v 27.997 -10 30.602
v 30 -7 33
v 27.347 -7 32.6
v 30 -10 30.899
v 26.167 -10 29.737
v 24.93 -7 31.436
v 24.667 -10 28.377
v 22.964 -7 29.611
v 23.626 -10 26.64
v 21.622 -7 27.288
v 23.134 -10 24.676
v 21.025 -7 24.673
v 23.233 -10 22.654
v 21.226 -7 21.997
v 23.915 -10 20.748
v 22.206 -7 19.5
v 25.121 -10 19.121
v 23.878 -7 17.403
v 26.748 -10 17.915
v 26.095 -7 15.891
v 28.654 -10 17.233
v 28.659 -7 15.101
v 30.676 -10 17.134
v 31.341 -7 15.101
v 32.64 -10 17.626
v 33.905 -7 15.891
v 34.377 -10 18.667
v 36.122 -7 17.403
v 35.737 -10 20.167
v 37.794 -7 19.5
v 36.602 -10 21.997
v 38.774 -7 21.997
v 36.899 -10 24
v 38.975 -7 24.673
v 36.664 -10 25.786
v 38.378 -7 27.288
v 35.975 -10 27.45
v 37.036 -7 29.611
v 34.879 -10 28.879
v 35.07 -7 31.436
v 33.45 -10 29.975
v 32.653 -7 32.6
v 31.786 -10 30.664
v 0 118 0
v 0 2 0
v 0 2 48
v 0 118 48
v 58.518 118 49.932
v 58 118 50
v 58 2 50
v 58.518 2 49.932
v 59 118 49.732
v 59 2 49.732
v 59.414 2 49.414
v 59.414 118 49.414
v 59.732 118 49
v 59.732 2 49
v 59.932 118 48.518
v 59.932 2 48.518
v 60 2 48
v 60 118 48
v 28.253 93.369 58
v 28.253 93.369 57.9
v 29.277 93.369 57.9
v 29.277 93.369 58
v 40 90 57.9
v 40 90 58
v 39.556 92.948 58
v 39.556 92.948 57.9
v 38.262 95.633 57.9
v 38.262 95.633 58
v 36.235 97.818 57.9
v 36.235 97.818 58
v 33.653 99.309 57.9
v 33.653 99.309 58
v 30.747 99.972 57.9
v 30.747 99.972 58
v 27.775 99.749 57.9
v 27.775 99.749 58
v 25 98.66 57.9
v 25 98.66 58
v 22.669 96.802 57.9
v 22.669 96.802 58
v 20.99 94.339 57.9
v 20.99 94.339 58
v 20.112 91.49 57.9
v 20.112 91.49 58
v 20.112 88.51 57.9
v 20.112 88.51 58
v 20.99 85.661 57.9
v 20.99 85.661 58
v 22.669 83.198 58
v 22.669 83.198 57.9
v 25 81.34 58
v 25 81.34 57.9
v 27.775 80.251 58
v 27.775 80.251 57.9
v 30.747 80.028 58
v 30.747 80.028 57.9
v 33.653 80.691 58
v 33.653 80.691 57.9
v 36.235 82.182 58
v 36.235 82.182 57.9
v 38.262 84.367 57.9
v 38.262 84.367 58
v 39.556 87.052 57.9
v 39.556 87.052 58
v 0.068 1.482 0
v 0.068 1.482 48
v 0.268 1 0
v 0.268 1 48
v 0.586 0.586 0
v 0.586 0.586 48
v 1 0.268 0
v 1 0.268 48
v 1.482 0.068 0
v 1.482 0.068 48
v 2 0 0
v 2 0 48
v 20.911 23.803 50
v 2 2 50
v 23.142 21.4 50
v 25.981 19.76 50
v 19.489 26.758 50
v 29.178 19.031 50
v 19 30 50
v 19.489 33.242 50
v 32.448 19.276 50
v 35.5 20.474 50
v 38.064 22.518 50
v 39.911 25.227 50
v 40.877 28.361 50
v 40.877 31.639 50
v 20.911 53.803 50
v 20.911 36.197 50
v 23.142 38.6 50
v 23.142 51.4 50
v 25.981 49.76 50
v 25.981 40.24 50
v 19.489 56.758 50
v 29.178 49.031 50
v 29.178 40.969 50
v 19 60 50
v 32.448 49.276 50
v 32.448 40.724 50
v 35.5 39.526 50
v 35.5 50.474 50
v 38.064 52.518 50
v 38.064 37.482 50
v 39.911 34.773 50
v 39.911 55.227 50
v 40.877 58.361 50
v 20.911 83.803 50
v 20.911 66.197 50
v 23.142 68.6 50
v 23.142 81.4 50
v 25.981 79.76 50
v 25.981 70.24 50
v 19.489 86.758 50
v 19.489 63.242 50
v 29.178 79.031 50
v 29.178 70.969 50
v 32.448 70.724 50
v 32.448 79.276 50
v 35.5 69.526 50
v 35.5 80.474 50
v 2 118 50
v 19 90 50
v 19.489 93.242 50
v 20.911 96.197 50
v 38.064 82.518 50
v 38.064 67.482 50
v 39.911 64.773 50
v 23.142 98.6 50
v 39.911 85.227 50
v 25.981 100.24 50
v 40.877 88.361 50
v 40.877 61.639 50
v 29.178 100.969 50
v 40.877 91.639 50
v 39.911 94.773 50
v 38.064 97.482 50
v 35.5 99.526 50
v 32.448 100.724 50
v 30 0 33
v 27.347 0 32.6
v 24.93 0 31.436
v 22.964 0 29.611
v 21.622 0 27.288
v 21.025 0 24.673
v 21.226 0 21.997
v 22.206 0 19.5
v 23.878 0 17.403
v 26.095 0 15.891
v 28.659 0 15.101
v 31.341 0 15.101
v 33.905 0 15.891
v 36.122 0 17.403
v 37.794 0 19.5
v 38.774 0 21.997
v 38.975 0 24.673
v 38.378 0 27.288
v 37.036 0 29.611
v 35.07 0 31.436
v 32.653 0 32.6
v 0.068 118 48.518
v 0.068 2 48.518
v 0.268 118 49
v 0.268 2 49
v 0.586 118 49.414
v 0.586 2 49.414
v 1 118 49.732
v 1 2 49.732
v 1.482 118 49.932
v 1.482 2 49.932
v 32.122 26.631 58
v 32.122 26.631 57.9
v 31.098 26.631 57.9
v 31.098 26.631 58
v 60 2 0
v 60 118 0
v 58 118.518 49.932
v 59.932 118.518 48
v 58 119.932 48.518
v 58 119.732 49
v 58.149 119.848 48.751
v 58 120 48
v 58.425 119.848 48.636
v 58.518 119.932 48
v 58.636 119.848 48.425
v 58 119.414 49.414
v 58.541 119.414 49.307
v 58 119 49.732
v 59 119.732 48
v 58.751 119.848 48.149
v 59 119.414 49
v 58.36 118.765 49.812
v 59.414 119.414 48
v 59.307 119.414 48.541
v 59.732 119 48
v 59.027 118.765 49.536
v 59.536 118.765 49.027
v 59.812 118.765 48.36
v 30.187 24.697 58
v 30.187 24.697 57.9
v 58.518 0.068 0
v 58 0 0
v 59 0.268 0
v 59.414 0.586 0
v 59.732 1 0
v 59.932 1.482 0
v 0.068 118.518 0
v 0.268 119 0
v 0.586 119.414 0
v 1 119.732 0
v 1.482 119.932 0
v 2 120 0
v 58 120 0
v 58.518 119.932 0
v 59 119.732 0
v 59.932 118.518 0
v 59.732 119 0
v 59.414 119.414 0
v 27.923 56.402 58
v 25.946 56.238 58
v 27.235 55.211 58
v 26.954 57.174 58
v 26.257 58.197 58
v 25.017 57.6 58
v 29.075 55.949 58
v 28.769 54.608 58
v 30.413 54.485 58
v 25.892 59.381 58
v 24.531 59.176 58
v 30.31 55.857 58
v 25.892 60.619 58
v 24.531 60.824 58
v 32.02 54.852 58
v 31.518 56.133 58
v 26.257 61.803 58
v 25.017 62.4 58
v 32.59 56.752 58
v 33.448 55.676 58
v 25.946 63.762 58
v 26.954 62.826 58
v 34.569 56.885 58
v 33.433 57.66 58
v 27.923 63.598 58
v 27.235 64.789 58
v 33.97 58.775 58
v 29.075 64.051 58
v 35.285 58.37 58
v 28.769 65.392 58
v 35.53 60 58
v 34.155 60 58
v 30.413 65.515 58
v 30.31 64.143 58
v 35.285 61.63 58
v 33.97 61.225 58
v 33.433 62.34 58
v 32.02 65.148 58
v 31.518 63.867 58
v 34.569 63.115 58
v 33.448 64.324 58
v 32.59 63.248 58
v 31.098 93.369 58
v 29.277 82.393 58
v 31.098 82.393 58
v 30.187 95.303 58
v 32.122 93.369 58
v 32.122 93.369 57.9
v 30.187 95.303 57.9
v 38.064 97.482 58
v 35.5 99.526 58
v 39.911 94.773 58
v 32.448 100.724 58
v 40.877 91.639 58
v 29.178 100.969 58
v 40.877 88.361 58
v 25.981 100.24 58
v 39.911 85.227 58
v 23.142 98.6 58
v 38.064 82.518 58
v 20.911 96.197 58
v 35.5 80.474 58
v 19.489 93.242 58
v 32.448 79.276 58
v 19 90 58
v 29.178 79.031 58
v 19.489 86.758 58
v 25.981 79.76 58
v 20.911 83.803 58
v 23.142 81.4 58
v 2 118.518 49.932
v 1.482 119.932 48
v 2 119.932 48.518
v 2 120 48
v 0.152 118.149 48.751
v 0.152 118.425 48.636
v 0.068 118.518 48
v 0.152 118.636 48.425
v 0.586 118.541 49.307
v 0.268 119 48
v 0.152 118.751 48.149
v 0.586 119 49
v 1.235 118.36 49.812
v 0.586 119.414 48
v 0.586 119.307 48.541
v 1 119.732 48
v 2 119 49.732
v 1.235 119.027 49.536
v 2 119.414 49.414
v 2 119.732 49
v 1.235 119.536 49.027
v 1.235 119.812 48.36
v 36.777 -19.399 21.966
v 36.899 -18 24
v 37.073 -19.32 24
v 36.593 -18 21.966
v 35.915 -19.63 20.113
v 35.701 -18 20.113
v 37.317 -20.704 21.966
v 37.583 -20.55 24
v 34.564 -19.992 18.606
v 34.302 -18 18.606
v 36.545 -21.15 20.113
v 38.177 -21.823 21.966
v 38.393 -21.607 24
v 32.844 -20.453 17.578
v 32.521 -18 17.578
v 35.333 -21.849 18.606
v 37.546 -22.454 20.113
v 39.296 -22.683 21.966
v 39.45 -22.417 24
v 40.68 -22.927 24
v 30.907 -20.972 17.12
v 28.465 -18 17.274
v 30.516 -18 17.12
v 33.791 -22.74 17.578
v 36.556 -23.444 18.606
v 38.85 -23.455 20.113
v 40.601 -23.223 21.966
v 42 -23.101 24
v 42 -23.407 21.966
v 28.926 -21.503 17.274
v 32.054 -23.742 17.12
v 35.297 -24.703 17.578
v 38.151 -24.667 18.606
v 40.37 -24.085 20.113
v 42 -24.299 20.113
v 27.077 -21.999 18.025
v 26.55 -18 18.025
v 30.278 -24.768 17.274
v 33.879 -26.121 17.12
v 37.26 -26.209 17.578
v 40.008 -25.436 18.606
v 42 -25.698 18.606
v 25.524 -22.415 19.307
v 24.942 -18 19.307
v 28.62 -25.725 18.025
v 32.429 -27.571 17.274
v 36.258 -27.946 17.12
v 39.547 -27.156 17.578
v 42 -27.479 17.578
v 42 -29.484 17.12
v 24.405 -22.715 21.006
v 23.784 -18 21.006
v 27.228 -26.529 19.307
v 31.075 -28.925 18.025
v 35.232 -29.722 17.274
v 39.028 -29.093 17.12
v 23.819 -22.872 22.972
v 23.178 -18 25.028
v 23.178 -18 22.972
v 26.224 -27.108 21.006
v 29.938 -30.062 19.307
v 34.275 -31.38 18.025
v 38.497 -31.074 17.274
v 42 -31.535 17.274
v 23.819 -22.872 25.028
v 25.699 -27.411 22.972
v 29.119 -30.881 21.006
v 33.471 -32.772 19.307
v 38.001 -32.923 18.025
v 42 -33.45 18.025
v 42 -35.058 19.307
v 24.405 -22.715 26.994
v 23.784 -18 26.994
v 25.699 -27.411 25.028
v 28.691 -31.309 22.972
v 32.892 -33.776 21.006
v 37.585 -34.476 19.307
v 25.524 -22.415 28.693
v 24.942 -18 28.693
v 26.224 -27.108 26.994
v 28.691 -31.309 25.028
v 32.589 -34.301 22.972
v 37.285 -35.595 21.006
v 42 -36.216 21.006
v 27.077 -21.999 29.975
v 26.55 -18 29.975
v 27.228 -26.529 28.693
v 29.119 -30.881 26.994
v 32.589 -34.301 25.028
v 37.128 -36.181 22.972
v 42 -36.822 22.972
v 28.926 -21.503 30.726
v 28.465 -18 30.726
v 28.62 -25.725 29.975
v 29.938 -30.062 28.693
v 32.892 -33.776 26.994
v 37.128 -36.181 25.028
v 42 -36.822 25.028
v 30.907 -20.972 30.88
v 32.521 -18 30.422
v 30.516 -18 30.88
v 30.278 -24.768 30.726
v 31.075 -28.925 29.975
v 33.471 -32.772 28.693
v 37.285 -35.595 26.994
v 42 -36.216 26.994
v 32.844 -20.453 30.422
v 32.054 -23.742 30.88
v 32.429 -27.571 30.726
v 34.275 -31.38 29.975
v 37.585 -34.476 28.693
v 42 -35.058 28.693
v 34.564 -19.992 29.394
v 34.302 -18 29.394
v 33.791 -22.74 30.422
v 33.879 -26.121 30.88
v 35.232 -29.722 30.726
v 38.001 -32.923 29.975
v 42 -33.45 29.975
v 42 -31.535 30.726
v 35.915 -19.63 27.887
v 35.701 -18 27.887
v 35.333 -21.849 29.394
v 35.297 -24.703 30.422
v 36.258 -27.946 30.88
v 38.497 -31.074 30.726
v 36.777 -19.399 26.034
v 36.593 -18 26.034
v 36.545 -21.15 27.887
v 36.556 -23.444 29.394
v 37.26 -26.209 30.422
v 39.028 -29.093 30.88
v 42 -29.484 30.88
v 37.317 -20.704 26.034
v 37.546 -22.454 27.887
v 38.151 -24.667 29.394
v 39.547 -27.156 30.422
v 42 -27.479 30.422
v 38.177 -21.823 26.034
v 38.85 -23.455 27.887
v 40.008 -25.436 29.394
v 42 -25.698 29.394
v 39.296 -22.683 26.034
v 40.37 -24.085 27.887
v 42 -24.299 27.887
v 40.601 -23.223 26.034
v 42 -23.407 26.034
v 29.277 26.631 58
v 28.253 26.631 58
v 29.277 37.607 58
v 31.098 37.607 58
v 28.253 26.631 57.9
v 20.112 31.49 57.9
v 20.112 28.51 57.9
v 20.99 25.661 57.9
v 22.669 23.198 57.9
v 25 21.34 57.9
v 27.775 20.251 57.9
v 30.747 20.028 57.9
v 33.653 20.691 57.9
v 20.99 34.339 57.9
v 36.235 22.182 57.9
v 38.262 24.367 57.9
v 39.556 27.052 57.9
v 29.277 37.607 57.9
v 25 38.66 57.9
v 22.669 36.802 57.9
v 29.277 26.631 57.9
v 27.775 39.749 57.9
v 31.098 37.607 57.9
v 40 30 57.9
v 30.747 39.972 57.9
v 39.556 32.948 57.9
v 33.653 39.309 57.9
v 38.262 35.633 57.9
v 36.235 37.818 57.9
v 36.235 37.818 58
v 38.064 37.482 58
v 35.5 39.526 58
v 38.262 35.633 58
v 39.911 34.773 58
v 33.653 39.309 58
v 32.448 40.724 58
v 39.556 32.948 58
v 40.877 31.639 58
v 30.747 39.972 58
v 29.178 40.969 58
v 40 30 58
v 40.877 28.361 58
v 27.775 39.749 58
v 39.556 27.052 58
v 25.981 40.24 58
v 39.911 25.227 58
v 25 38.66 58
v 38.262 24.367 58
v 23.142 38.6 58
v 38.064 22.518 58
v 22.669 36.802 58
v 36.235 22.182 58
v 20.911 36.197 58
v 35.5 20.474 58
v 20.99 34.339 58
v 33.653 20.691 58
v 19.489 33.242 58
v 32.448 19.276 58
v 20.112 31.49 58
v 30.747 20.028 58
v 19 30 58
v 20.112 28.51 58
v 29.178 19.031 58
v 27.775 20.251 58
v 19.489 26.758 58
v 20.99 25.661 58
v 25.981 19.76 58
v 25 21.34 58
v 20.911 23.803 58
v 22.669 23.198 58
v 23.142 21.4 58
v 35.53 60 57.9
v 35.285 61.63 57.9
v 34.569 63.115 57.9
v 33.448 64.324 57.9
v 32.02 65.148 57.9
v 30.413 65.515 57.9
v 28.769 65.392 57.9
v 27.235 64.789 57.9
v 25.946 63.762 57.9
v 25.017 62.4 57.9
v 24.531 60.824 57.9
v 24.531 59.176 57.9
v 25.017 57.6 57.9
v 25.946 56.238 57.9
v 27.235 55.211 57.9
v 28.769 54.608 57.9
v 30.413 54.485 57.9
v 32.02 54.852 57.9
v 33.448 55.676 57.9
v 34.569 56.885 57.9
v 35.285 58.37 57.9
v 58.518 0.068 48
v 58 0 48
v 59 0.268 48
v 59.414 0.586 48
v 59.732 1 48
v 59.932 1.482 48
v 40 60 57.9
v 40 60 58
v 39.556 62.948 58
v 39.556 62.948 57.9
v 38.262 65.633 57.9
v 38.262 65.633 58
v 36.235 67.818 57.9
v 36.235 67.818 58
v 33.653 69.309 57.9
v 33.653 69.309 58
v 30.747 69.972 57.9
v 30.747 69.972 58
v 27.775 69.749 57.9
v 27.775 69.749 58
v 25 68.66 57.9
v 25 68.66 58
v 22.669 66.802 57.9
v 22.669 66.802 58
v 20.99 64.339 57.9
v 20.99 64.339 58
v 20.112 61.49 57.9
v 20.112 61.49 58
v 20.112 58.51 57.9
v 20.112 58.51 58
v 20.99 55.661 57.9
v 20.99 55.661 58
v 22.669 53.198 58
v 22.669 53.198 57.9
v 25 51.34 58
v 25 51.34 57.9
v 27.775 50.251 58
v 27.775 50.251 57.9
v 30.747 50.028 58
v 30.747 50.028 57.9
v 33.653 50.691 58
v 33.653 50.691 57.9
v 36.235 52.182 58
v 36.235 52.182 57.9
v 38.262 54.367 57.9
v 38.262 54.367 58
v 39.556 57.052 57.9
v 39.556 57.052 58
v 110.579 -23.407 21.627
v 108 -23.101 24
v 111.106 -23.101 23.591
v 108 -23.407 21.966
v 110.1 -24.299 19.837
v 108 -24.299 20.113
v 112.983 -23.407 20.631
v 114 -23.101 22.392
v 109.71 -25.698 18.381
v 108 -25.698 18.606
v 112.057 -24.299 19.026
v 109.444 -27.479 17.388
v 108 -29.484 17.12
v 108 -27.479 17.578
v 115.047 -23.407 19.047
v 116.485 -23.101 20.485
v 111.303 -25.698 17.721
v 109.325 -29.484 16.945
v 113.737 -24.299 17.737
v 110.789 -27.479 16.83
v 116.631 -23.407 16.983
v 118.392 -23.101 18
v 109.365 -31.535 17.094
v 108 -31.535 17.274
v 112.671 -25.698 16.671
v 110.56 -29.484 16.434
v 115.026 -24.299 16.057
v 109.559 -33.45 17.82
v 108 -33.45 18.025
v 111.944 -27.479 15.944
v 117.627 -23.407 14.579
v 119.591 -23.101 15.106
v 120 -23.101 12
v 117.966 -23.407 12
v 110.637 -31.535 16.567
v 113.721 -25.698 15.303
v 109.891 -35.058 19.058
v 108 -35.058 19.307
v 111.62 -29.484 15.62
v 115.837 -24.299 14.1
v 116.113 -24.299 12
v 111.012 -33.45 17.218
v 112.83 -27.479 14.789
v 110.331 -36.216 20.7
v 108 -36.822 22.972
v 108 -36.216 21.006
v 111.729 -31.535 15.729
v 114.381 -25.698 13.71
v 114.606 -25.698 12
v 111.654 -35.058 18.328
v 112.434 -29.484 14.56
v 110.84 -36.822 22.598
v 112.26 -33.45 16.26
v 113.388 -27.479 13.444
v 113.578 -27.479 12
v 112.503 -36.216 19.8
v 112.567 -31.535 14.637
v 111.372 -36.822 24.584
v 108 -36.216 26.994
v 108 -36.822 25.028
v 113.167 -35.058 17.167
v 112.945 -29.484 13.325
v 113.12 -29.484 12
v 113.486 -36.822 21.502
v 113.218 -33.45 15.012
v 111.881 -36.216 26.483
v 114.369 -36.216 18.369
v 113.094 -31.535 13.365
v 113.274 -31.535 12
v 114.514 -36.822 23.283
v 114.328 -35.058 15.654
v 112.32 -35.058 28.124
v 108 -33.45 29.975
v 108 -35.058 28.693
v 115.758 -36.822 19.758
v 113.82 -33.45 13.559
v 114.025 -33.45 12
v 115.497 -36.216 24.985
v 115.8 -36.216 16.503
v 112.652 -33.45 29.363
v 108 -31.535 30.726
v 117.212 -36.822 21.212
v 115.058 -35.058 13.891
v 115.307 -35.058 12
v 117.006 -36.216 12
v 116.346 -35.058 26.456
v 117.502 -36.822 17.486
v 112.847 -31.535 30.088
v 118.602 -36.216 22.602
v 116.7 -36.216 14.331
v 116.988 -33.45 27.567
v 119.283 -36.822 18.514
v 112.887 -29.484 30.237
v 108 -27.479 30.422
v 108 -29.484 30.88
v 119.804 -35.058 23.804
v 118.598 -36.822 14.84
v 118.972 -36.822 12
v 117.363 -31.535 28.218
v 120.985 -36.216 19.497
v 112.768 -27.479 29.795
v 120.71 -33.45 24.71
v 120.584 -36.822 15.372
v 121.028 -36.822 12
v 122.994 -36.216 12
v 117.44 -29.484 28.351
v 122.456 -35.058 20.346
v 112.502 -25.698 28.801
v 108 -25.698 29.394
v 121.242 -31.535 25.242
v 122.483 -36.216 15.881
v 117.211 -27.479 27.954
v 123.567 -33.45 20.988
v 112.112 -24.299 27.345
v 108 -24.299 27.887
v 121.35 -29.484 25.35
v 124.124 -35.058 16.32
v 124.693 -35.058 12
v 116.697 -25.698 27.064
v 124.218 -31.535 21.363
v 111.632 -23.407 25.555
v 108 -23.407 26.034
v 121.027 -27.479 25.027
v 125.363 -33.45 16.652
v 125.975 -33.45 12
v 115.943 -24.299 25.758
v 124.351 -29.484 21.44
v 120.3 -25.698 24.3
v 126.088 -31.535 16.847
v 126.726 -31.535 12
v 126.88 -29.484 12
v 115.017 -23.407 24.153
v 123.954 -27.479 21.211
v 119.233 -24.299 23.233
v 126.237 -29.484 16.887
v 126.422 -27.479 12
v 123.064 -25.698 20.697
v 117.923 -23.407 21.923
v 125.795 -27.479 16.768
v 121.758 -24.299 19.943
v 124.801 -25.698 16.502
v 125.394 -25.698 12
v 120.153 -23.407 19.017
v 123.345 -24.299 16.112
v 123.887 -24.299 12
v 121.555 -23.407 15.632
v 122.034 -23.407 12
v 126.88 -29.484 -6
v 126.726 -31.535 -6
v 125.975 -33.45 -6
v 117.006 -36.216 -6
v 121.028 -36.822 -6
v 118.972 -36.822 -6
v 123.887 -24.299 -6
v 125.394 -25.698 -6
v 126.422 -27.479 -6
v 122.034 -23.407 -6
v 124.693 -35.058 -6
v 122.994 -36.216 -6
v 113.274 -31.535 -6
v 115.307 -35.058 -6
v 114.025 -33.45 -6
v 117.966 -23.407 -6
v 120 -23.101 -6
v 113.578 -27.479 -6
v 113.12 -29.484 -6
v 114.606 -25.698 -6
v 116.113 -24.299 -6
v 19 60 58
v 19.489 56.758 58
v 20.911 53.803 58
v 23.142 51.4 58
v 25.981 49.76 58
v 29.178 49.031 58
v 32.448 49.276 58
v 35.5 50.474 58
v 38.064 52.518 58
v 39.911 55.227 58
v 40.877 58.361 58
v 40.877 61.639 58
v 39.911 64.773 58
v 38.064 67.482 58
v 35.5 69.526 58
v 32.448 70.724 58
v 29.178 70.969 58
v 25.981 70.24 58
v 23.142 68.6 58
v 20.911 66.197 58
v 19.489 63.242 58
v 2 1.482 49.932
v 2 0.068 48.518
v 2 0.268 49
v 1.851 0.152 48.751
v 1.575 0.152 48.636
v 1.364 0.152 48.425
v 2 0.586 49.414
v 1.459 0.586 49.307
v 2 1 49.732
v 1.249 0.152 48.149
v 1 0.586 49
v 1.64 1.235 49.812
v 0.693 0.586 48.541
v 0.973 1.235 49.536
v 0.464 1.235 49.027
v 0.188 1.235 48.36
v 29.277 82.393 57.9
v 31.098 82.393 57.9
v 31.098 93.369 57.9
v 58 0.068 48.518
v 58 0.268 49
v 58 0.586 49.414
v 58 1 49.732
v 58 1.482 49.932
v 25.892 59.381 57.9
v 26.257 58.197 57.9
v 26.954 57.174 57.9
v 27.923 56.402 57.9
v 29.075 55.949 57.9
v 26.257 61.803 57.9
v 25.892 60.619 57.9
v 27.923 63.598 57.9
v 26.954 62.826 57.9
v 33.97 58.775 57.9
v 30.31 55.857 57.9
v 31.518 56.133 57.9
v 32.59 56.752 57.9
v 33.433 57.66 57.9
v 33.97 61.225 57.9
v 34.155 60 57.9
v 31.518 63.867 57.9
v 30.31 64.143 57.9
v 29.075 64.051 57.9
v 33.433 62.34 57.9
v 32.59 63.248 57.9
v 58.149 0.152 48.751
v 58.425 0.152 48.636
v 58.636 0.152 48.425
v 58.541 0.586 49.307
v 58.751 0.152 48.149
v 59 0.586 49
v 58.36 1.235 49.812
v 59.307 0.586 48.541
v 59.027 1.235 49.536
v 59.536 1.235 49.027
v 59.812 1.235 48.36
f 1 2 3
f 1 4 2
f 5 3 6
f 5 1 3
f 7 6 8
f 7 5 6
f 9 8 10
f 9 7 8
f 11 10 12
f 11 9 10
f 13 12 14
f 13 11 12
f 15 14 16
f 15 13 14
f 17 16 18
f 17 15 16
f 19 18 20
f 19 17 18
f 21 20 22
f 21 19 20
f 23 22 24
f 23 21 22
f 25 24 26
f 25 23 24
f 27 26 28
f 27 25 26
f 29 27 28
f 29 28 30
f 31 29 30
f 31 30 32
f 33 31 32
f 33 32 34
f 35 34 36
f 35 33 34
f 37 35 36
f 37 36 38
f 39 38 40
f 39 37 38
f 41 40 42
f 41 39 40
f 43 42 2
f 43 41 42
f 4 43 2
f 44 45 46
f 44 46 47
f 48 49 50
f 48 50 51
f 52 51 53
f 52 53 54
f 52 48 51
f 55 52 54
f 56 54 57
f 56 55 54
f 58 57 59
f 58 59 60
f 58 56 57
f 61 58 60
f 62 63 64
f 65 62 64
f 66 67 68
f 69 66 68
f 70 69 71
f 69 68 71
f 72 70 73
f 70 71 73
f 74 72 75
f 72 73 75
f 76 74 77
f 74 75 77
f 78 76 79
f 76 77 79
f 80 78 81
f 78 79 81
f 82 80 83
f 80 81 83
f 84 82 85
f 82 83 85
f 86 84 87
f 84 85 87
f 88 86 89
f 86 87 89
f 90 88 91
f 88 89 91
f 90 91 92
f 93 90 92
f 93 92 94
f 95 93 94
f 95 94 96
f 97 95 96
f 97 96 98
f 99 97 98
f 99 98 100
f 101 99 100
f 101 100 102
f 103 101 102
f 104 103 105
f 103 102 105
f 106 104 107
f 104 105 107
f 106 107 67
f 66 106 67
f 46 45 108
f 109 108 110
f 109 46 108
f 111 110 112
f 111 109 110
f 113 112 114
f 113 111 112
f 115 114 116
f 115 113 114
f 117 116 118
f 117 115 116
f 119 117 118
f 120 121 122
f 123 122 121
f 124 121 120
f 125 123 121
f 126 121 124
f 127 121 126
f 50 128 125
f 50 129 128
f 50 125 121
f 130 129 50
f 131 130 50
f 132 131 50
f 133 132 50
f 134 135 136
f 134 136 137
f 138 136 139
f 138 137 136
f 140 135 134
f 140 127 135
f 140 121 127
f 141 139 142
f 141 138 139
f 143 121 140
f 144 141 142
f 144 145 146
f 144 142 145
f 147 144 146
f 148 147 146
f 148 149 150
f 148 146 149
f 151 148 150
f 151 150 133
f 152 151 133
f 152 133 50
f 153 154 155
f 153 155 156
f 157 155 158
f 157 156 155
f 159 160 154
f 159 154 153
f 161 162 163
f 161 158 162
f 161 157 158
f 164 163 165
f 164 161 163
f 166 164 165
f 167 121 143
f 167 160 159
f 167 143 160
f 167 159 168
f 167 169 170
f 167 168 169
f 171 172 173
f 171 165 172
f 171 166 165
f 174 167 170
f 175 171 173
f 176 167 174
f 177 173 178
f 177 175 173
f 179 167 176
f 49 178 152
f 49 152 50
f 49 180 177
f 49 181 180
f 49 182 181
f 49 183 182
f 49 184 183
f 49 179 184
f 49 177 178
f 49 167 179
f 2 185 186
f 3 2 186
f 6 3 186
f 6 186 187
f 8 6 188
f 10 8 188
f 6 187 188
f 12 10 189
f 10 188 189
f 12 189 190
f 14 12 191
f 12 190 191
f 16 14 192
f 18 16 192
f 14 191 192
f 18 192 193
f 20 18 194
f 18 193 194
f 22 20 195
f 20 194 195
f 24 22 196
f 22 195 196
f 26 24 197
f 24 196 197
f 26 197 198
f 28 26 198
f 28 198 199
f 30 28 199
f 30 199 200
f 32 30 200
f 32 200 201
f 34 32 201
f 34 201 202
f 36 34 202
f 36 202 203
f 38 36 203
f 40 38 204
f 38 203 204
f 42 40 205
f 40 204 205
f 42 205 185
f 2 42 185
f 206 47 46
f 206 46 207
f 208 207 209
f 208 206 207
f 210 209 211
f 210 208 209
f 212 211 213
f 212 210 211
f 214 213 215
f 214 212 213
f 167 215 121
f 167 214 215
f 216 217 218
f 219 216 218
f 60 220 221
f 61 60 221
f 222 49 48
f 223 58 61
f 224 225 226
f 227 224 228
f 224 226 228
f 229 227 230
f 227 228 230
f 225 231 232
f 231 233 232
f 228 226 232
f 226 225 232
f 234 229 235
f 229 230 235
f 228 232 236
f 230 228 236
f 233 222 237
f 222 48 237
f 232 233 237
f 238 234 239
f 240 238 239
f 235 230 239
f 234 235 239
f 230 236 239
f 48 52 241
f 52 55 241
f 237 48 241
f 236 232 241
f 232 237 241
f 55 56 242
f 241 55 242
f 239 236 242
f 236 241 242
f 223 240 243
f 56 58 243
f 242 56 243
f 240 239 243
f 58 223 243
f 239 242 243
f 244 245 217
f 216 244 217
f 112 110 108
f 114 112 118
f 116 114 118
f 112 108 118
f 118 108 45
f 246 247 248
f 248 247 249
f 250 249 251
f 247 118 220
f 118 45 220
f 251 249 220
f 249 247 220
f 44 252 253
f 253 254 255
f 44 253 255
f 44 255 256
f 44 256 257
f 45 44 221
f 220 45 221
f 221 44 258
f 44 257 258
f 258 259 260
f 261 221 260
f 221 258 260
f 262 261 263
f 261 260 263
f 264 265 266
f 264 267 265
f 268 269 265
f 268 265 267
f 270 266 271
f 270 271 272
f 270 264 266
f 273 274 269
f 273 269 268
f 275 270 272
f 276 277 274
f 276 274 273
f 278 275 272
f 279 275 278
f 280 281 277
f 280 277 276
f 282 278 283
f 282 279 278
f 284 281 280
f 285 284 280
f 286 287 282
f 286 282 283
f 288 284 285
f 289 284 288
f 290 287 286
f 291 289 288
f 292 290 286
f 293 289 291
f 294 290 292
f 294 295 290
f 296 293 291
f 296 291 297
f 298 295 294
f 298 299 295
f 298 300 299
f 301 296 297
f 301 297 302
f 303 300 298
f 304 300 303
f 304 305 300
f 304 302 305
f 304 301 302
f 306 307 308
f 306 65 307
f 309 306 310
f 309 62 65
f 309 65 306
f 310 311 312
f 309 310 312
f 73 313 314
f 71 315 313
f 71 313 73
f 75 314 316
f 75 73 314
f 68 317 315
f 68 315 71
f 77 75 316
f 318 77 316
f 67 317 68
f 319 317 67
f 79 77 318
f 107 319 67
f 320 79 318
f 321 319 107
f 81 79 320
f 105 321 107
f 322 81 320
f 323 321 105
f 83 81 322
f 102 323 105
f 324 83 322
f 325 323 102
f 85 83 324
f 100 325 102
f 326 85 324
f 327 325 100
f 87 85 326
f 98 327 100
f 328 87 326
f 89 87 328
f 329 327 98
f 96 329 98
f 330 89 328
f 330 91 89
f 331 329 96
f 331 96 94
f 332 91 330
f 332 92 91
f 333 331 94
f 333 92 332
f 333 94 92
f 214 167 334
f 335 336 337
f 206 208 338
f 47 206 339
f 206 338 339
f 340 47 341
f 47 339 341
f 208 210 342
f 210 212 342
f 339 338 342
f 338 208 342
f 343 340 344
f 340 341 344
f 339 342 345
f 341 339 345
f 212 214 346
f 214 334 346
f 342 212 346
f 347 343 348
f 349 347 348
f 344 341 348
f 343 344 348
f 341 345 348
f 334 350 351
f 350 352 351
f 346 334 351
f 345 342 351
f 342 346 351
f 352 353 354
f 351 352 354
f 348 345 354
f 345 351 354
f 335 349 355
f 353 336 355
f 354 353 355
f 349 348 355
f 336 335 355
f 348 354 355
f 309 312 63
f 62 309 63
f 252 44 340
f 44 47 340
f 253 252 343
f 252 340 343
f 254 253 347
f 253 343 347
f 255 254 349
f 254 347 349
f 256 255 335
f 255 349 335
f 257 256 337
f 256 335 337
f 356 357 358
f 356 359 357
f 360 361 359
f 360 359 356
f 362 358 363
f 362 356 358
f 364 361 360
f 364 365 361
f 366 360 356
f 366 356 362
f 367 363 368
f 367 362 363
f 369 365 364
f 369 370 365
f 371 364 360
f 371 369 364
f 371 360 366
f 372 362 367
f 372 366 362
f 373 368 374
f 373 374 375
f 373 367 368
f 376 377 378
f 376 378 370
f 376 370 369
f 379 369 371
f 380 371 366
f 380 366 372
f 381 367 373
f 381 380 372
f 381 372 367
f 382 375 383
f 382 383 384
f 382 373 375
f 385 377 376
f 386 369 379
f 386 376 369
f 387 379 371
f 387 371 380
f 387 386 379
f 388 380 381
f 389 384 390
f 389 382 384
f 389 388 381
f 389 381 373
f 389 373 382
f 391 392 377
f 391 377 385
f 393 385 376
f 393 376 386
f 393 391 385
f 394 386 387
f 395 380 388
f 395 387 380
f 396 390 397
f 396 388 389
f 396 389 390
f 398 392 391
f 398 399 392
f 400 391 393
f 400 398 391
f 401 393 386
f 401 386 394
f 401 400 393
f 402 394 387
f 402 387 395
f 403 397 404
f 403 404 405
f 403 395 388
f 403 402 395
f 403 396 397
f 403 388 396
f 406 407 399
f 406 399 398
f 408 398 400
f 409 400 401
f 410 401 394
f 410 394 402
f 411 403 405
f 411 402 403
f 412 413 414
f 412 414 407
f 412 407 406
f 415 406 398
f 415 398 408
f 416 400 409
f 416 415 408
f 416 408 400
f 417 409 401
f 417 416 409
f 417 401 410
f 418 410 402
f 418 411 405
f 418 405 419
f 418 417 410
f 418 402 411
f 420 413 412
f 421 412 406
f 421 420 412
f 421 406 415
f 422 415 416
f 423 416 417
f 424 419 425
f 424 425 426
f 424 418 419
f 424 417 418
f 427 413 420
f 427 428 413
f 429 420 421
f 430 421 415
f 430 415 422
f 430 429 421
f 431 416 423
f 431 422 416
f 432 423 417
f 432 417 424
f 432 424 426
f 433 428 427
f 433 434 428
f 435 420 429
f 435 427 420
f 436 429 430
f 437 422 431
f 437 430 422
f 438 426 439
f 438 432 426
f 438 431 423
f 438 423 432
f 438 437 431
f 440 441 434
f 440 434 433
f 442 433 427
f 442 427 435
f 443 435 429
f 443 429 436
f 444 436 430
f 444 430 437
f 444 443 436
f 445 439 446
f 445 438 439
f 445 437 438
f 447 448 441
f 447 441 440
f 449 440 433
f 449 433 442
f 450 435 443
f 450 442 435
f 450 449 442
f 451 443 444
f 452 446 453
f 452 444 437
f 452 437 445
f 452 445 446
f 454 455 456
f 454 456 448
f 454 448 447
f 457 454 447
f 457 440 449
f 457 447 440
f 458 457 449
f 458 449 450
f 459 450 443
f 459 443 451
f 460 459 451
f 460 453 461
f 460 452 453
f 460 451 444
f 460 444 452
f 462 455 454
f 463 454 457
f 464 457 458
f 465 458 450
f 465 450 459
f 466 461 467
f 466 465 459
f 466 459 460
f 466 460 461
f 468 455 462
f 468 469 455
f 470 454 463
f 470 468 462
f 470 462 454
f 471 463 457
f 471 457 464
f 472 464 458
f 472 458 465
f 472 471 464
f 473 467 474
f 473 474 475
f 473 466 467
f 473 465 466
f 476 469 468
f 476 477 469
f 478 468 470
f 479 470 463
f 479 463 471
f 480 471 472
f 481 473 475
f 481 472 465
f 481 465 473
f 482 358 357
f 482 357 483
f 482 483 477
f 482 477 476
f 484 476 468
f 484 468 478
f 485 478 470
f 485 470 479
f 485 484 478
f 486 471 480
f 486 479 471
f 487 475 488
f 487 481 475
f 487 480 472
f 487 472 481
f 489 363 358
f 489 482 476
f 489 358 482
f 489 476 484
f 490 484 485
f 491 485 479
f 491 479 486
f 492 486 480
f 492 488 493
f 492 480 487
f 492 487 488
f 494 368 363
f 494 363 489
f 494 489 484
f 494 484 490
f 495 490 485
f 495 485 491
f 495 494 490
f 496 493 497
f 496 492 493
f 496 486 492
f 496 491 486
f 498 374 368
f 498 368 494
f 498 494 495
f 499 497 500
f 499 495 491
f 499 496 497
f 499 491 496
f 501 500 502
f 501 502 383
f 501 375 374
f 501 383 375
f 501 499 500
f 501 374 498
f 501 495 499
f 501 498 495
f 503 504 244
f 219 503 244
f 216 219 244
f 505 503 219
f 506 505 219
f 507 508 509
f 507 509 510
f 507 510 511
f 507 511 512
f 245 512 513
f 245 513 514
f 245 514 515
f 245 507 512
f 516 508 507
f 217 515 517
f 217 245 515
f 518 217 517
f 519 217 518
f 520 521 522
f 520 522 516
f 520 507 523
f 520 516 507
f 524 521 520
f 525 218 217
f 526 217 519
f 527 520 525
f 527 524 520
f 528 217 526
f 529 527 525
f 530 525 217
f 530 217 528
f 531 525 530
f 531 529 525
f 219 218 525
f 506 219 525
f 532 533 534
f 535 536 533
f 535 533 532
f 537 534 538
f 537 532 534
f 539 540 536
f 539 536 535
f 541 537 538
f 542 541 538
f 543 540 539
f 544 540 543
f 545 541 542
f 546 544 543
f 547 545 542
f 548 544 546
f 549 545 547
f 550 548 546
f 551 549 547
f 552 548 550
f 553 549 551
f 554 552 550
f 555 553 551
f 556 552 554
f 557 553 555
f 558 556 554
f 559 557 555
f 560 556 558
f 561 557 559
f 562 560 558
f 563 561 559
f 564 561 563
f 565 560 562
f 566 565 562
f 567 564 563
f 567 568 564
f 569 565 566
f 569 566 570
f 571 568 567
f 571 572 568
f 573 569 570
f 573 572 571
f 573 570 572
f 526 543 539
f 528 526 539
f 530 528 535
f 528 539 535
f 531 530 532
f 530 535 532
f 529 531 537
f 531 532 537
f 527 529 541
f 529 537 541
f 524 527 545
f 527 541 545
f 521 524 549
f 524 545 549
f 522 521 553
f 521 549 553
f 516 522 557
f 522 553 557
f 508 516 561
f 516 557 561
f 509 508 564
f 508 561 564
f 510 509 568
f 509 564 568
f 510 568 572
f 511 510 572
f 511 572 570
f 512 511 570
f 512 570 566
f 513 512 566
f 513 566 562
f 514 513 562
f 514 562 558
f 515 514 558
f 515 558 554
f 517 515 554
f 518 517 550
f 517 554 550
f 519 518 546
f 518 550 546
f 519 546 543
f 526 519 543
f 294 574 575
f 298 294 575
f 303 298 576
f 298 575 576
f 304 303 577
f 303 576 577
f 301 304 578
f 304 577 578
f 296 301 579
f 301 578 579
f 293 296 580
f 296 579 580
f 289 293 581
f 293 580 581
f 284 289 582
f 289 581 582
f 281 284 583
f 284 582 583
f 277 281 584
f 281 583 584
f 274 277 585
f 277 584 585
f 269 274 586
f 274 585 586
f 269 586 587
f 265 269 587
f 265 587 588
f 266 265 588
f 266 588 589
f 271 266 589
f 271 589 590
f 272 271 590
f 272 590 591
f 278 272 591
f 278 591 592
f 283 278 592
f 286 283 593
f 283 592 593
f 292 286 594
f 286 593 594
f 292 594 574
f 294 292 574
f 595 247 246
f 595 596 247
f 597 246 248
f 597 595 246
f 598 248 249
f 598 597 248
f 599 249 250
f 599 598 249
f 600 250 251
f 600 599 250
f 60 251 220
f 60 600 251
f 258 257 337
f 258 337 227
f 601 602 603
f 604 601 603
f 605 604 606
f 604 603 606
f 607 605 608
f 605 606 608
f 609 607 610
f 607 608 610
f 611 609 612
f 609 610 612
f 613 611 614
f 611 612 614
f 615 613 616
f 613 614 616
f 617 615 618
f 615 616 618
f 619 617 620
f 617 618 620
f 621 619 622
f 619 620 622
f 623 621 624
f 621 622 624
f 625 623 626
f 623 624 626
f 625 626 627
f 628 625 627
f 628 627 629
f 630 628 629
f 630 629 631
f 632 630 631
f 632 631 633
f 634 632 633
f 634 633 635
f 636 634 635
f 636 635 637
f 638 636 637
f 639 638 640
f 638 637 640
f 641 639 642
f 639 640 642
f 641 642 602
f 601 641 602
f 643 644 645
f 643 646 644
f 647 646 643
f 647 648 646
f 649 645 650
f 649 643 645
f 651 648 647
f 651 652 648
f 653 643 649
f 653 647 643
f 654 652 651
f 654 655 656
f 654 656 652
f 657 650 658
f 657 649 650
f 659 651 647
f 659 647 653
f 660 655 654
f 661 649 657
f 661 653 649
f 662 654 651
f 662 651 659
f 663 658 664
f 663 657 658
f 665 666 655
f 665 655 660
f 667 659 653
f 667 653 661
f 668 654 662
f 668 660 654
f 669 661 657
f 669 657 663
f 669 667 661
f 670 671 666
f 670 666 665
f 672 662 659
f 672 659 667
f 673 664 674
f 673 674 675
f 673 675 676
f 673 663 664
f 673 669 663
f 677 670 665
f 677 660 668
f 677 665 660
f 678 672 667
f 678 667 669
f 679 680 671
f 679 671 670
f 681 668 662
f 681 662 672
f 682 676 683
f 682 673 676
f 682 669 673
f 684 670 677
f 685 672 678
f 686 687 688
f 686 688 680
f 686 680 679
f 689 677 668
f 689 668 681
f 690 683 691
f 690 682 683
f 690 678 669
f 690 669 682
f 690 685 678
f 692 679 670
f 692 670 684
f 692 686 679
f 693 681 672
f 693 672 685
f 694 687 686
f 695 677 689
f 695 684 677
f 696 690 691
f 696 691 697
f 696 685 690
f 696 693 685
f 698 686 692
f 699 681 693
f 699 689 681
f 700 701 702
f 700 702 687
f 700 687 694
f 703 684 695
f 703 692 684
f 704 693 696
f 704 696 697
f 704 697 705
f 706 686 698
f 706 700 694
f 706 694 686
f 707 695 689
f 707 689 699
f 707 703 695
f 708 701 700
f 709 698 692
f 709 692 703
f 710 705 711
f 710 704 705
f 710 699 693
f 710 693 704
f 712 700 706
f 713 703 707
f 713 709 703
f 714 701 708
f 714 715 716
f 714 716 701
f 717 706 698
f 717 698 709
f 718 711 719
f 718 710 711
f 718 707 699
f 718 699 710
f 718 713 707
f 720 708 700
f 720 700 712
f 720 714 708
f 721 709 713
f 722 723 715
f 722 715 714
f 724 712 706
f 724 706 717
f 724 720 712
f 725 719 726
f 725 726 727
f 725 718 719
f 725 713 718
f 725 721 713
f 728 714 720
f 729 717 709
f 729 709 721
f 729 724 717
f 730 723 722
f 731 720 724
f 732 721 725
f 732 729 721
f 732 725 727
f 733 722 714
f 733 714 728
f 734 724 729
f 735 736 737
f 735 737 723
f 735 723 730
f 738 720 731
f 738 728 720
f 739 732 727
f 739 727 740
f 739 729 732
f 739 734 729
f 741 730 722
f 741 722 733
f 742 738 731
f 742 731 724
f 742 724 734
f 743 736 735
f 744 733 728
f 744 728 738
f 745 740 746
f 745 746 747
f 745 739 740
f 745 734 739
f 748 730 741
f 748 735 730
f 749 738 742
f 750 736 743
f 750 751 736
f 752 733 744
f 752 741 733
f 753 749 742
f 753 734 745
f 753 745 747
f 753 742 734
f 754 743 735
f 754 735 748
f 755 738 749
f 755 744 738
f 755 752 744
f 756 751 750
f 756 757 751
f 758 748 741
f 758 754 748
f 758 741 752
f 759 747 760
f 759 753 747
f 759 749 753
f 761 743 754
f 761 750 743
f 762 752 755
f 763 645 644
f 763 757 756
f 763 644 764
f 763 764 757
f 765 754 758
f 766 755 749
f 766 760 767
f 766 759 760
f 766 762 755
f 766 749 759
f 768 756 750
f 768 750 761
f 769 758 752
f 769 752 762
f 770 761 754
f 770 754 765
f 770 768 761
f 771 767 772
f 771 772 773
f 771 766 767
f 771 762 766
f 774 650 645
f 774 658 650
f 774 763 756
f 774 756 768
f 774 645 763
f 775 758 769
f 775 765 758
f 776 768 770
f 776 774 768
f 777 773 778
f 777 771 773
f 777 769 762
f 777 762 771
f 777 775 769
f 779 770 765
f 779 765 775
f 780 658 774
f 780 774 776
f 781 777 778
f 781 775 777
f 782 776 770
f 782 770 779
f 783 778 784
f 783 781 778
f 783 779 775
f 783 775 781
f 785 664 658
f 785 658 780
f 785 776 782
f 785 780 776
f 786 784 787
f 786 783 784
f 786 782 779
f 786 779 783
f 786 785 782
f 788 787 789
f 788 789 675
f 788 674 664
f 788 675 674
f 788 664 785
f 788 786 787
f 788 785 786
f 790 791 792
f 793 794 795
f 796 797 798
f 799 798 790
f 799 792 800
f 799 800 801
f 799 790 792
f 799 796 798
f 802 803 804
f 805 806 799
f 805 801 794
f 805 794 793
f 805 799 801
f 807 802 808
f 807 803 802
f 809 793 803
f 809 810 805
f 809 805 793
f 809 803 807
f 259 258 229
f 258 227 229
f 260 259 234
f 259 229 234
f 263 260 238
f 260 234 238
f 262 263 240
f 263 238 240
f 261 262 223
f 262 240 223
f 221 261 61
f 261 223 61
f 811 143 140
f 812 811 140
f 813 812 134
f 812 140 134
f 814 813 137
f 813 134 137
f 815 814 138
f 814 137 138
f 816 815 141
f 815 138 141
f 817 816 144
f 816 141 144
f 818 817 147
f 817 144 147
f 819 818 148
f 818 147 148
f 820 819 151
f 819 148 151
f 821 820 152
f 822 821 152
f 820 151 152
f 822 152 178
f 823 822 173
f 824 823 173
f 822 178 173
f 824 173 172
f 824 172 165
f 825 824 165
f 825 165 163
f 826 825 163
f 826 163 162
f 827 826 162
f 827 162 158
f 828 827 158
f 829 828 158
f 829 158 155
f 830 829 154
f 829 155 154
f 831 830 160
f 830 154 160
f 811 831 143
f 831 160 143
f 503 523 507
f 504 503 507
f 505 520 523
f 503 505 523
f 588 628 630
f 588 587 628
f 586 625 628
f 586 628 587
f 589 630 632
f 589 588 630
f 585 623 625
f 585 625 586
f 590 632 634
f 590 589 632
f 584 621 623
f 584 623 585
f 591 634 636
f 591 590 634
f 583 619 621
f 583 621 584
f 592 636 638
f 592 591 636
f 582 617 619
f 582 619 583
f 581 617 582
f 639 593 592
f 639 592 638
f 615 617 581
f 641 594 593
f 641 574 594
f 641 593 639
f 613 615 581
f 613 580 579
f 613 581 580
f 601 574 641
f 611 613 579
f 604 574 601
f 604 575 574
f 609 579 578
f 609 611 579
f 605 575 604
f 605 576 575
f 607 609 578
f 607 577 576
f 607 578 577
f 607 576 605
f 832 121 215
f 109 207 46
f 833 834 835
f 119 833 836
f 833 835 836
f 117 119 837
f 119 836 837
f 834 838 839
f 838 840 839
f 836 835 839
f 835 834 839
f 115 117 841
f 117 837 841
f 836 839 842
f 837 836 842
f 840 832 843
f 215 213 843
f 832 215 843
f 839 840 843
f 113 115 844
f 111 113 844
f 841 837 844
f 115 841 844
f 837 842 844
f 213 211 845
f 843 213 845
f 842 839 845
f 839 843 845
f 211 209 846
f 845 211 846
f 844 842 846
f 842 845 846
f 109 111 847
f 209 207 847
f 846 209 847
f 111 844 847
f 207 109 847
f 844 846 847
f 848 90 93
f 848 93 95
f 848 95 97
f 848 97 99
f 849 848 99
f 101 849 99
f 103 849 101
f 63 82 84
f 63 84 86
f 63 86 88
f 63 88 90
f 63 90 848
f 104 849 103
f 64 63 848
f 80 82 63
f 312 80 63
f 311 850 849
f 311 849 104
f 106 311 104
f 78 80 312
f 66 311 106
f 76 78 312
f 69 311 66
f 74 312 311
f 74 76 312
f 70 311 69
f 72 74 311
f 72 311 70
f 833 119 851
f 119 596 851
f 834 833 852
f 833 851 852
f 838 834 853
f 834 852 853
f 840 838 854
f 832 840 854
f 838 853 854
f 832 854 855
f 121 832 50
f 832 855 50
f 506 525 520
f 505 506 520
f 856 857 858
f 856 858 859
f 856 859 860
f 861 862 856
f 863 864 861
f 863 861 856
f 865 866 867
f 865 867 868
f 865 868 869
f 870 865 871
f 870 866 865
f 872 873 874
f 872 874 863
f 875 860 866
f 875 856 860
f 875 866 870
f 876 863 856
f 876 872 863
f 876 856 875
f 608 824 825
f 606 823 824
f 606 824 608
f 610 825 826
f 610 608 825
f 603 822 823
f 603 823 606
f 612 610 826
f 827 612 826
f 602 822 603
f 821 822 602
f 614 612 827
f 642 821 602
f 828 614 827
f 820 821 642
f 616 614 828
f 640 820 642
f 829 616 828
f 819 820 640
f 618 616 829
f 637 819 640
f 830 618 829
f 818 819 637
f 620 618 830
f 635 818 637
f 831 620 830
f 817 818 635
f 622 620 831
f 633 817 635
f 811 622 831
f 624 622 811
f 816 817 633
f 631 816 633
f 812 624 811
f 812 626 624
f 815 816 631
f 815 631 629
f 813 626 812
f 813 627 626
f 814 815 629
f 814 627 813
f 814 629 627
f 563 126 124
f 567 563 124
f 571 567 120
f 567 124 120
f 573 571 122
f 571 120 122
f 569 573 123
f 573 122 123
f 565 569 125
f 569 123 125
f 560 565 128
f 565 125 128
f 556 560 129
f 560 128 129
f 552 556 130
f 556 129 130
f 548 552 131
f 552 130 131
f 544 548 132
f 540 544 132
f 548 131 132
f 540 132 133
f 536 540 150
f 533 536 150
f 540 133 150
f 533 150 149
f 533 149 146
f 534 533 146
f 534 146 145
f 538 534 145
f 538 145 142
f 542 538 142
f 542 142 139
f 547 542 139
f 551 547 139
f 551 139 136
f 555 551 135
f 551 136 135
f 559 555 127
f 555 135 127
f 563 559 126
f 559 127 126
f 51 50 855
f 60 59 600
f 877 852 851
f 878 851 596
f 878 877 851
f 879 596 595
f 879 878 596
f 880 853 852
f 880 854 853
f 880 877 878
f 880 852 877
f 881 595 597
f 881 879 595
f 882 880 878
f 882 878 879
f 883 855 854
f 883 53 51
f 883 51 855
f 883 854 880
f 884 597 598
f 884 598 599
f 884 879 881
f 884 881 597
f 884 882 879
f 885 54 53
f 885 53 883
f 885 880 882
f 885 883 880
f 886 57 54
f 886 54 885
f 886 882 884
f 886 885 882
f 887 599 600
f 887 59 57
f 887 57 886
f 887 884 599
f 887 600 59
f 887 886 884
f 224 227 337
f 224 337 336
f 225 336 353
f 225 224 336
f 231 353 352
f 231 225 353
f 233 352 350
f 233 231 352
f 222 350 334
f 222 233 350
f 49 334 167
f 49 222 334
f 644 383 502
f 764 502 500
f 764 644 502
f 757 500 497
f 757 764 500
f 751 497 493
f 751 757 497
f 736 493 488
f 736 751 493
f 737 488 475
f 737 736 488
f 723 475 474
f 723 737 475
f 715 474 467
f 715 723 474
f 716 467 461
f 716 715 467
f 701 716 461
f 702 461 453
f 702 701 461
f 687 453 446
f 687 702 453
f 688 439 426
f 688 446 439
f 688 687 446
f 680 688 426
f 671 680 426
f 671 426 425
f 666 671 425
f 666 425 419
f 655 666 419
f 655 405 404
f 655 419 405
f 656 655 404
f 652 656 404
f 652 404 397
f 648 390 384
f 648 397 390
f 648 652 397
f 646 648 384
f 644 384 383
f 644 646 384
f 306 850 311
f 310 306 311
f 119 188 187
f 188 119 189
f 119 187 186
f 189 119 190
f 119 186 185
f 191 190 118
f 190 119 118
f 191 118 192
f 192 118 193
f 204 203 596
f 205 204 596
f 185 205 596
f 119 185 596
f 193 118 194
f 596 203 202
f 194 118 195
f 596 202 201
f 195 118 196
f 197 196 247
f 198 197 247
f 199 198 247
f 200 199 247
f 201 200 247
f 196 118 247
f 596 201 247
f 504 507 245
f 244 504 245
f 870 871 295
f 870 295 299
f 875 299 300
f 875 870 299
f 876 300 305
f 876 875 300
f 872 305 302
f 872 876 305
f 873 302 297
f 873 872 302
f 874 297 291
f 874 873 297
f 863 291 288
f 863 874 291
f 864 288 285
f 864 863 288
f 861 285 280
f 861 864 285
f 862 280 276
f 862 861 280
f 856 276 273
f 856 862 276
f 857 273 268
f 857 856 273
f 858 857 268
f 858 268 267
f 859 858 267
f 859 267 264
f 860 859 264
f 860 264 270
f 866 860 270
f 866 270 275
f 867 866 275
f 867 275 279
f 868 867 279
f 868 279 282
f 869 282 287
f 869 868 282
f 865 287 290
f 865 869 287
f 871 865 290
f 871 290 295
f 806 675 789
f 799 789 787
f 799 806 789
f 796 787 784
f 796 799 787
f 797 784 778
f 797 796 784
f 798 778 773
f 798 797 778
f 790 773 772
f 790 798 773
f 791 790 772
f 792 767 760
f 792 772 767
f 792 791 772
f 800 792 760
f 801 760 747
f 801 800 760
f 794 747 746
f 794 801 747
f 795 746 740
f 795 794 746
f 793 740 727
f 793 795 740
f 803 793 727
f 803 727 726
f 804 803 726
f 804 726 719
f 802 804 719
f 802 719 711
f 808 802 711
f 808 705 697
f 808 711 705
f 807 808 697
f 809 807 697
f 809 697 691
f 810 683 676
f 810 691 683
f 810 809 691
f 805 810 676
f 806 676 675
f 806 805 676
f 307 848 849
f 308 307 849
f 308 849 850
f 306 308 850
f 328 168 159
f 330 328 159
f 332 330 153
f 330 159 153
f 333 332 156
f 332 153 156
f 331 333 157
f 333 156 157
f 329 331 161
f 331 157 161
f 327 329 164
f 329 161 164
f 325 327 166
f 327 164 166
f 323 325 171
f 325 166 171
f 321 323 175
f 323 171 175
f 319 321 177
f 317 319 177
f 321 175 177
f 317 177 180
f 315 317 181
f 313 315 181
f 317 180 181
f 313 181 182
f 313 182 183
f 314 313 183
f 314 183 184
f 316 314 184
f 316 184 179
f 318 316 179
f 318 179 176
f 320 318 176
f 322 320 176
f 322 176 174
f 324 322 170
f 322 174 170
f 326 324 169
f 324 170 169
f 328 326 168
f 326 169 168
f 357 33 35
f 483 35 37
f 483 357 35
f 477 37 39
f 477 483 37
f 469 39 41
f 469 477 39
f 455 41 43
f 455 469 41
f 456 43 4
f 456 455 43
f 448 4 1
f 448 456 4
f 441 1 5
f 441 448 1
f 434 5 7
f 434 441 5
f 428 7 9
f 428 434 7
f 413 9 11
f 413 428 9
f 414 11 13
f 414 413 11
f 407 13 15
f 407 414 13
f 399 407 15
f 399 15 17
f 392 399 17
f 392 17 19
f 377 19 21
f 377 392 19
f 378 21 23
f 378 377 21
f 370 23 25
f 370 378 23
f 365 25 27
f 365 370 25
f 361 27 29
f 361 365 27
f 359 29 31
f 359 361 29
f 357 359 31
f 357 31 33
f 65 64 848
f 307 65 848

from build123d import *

# Parameters (mm, degrees)
CROQUIS1_W              = 60
CROQUIS1_H              = 120
SALIENTE_EXTRUIR1_DEPTH = 50
CROQUIS2_R              = 11
SALIENTE_EXTRUIR2_DEPTH = 8
CROQUIS3_R              = 10
CORTAR_EXTRUIR1_DEPTH   = 0.1
SALIENTE_EXTRUIR3_DEPTH = 0.1
CROQUIS5_R              = 5.530403268
CROQUIS5_R_2            = 4.15467208
SALIENTE_EXTRUIR4_DEPTH = 0.1
REDONDEO1_R             = 2
CROQUIS6_R              = 9
SALIENTE_EXTRUIR5_DEPTH = 10
CHAFL_N1_SIZE           = 3
CHAFL_N1_SIZE2          = 2.100622615
CROQUIS8_R              = 6.899377385


with BuildPart() as part:
    # Croquis1 → Saliente-Extruir1 (new body)
    with BuildSketch(Plane.XY):
        with Locations((30, 60)):
            Rectangle(CROQUIS1_W, CROQUIS1_H)
    extrude(amount=SALIENTE_EXTRUIR1_DEPTH)

    # Croquis2 → Saliente-Extruir2 (add)
    with BuildSketch(Plane.XY.offset(50)):
        with Locations(Location((30, 60, 0), (0, 0, 180))):
            Circle(CROQUIS2_R)
        with Locations(Location((30, 90, 0), (0, 0, 180))):
            Circle(CROQUIS2_R)
        with Locations(Location((30, 30, 0), (0, 0, 180))):
            Circle(CROQUIS2_R)
    extrude(amount=SALIENTE_EXTRUIR2_DEPTH)

    # Croquis3 → Cortar-Extruir1 (cut)
    with BuildSketch(Plane.XY.offset(58)):
        with Locations((30, 90)):
            Circle(CROQUIS3_R)
        with Locations((30, 60)):
            Circle(CROQUIS3_R)
        with Locations((30, 30)):
            Circle(CROQUIS3_R)
    extrude(amount=-CORTAR_EXTRUIR1_DEPTH, mode=Mode.SUBTRACT)

    # Croquis4 → Saliente-Extruir3 (add)
    with BuildSketch(Plane.XY.offset(57.9)):
        Polygon((29.277033543, 82.393028635), (31.097592421, 82.393028635), (31.097592421, 93.369086775), (32.121534281, 93.369086775), (31.097592421, 94.393028635), (30.187312982, 95.303308074), (29.277033543, 94.393028635), (28.253091683, 93.369086775), (29.277033543, 93.369086775), align=None)
        Polygon((29.277033543, 26.630913225), (28.253091683, 26.630913225), (29.277033543, 25.606971365), (30.187312982, 24.696691926), (31.097592421, 25.606971365), (32.121534281, 26.630913225), (31.097592421, 26.630913225), (31.097592421, 37.606971365), (29.277033543, 37.606971365), align=None)
    extrude(amount=SALIENTE_EXTRUIR3_DEPTH)

    # Croquis5 → Saliente-Extruir4 (add)
    with BuildSketch(Plane.XY.offset(57.9)):
        with Locations((30, 60)):
            Circle(CROQUIS5_R)
        with Locations((30, 60)):
            Circle(CROQUIS5_R_2, mode=Mode.SUBTRACT)
    extrude(amount=SALIENTE_EXTRUIR4_DEPTH)

    # Redondeo1
    redondeo1_edges = [part.edges().sort_by_distance(p)[0] for p in [
        (60, 60, 50),
        (30, 120, 50),
        (0, 60, 50),
        (30, 0, 50),
        (0, 120, 25),
        (60, 120, 25),
        (60, 0, 25),
        (0, 0, 25),
    ]]
    fillet(redondeo1_edges, radius=REDONDEO1_R)

    # Croquis6 → Saliente-Extruir5 (add)
    with BuildSketch(Plane.XZ):
        with Locations(Location((30, 24, 0), (0, 0, 90))):
            Circle(CROQUIS6_R)
    extrude(amount=SALIENTE_EXTRUIR5_DEPTH)

    # Chaflán1
    chafl_n1_edges = [part.edges().sort_by_distance(p)[0] for p in [
        (30, -10, 15),
    ]]
    chafl_n1_side = [part.faces().sort_by_distance(p)[0] for p in [
        (30, -5, 15),
    ]]
    chamfer(chafl_n1_edges, length=CHAFL_N1_SIZE, length2=CHAFL_N1_SIZE2, reference=chafl_n1_side[0])

    # Barrer1: sweep along a curve in space
    with BuildLine() as barrer1_path:
        Line((30, -10, 24), (30, -18, 24))
        ThreePointArc((30, -18, 24), (33.514718626, -26.485281374, 24), (42, -30, 24))
        Line((42, -30, 24), (108, -30, 24))
        ThreePointArc((108, -30, 24), (116.485281374, -30, 20.485281374), (120, -30, 12))
        Line((120, -30, 12), (120, -30, -6))
    # Croquis8 → Barrer1 (sweep)
    with BuildSketch(Plane.XZ.offset(10)):
        with Locations((30, 24)):
            Circle(CROQUIS8_R)
    sweep(path=barrer1_path.line)


solid = part.part
